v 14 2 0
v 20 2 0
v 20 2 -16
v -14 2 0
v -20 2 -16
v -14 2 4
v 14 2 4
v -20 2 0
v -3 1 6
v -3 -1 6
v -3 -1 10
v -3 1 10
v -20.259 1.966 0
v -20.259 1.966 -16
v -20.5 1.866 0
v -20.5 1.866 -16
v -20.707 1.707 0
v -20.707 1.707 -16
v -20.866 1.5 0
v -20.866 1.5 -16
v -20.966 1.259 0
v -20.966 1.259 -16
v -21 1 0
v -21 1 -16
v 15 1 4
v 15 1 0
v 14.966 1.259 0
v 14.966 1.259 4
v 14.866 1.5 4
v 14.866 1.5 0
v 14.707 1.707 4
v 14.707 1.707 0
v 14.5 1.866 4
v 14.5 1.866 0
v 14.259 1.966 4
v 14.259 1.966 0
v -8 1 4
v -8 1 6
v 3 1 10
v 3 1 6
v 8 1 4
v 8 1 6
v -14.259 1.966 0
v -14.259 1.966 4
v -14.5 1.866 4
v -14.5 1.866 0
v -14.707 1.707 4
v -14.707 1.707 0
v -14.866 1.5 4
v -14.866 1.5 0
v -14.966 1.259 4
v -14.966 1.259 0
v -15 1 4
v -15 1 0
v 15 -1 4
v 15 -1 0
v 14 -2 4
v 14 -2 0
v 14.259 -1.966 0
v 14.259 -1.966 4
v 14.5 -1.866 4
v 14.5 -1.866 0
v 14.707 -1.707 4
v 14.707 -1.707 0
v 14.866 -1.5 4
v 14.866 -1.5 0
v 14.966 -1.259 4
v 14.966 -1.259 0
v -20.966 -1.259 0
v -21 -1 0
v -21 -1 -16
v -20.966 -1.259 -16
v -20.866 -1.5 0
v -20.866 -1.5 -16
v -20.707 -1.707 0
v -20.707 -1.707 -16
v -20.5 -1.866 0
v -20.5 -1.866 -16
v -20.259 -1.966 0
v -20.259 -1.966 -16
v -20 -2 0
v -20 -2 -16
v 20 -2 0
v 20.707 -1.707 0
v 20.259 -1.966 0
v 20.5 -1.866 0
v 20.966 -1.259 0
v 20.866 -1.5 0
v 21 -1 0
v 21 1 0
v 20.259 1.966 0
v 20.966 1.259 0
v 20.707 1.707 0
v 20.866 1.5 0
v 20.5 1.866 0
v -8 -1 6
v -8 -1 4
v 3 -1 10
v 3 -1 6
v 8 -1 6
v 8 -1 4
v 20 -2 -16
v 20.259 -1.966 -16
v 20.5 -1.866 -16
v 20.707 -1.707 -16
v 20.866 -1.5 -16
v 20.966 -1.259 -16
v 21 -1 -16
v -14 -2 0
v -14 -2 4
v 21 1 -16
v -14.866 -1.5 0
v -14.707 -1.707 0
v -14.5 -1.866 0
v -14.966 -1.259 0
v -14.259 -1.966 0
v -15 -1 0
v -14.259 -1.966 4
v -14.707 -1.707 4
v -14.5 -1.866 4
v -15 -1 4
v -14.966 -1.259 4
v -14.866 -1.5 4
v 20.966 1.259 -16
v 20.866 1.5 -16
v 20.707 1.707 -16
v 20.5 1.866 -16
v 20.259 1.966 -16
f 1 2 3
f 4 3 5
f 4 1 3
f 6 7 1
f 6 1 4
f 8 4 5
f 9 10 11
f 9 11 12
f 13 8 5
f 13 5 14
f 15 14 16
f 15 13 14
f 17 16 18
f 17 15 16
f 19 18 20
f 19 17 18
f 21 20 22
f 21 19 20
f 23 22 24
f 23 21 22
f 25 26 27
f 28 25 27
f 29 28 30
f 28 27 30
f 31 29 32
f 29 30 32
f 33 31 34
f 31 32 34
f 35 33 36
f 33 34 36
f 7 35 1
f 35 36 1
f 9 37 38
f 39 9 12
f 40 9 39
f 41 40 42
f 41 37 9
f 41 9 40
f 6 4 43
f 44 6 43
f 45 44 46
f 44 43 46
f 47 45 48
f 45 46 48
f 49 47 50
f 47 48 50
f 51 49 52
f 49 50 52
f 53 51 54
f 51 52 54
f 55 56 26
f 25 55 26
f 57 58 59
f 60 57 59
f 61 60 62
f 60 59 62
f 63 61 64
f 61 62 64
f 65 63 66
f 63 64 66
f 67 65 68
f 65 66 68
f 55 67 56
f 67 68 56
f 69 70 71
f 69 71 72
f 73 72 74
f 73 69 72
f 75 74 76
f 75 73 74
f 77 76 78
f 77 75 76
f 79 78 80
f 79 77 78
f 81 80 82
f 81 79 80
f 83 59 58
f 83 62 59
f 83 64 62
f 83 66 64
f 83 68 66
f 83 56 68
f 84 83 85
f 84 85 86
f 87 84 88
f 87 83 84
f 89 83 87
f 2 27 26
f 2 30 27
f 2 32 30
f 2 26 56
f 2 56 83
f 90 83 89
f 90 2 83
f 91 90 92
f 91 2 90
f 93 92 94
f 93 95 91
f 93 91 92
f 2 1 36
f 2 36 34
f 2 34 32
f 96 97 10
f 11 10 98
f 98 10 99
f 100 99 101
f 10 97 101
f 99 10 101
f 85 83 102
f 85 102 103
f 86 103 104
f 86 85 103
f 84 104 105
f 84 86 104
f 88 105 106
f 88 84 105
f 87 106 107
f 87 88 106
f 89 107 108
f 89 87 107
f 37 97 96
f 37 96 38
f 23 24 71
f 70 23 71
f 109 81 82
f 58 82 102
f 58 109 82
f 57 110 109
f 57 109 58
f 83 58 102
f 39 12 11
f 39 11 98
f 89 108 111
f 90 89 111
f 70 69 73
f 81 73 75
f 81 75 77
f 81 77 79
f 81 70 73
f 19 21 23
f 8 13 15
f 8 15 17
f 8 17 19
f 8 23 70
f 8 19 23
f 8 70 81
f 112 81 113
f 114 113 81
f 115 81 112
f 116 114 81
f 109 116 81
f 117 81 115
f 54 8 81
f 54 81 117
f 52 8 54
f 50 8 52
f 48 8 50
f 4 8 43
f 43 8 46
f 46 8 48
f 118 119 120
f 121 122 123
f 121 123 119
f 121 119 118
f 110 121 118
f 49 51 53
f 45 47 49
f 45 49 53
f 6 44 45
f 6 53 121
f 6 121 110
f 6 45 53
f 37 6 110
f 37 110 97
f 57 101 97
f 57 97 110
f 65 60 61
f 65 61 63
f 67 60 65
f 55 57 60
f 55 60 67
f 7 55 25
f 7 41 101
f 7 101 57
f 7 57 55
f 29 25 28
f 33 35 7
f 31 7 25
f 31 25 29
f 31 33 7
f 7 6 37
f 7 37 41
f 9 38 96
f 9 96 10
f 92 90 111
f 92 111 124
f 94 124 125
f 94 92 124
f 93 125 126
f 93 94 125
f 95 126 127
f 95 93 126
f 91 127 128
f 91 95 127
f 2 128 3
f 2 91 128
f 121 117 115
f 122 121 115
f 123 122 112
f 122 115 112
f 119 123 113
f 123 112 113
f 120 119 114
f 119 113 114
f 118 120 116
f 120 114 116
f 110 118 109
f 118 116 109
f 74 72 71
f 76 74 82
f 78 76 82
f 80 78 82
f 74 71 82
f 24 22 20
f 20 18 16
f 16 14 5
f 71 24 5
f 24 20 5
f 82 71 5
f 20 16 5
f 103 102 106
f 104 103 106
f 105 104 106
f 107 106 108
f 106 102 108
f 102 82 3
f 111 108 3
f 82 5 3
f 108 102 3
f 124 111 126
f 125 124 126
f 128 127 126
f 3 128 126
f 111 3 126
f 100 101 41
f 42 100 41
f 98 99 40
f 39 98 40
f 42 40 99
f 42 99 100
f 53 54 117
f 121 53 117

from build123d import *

# Parameters (mm, degrees)
F0_W     = 5
F0_H     = 2
F0_W_2   = 6
F1_DEPTH = 16
F2_DEPTH = 4
F3_DEPTH = 6
F4_DEPTH = 10


with BuildPart() as f1:
    # F0 (on Top) → F1 (new body)
    with BuildSketch(Plane.XY):
        with BuildLine():
            Line((-20, -2), (-14, -2))
            ThreePointArc((-14, -2), (-14.707107, -1.707107), (-15, -1))
            Line((-15, -1), (-15, 1))
            ThreePointArc((-15, 1), (-14.707107, 1.707107), (-14, 2))
            Line((-14, 2), (-20, 2))
            ThreePointArc((-20, 2), (-20.707107, 1.707107), (-21, 1))
            Line((-21, 1), (-21, -1))
            ThreePointArc((-21, -1), (-20.707107, -1.707107), (-20, -2))
        make_face()
        with BuildLine():
            Line((-14, -2), (14, -2))
            ThreePointArc((14, -2), (14.707107, -1.707107), (15, -1))
            Line((15, -1), (15, 1))
            ThreePointArc((15, 1), (14.707107, 1.707107), (14, 2))
            Line((14, 2), (-14, 2))
            ThreePointArc((-14, 2), (-14.707107, 1.707107), (-15, 1))
            Line((-15, 1), (-15, -1))
            ThreePointArc((-15, -1), (-14.707107, -1.707107), (-14, -2))
        make_face()
        Polygon((8, -1), (3, -1), (-3, -1), (-8, -1), (-8, 1), (-3, 1), (3, 1), (8, 1), align=None, mode=Mode.SUBTRACT)
        with Locations((-5.5, 0)):
            Rectangle(F0_W, F0_H)
        Rectangle(F0_W_2, F0_H)
        with Locations((5.5, 0)):
            Rectangle(F0_W, F0_H)
        with BuildLine():
            Line((14, -2), (20, -2))
            ThreePointArc((20, -2), (20.707107, -1.707107), (21, -1))
            Line((21, -1), (21, 1))
            ThreePointArc((21, 1), (20.707107, 1.707107), (20, 2))
            Line((20, 2), (14, 2))
            ThreePointArc((14, 2), (14.707107, 1.707107), (15, 1))
            Line((15, 1), (15, -1))
            ThreePointArc((15, -1), (14.707107, -1.707107), (14, -2))
        make_face()
    extrude(amount=-F1_DEPTH)

    # F0 (on Top) → F2 (join)
    with BuildSketch(Plane.XY):
        with BuildLine():
            Line((-14, -2), (14, -2))
            ThreePointArc((14, -2), (14.707107, -1.707107), (15, -1))
            Line((15, -1), (15, 1))
            ThreePointArc((15, 1), (14.707107, 1.707107), (14, 2))
            Line((14, 2), (-14, 2))
            ThreePointArc((-14, 2), (-14.707107, 1.707107), (-15, 1))
            Line((-15, 1), (-15, -1))
            ThreePointArc((-15, -1), (-14.707107, -1.707107), (-14, -2))
        make_face()
        Polygon((8, -1), (3, -1), (-3, -1), (-8, -1), (-8, 1), (-3, 1), (3, 1), (8, 1), align=None, mode=Mode.SUBTRACT)
    extrude(amount=F2_DEPTH)

    # F0 (on Top) → F3 (join)
    with BuildSketch(Plane.XY):
        with Locations((-5.5, 0)):
            Rectangle(F0_W, F0_H)
        with Locations((5.5, 0)):
            Rectangle(F0_W, F0_H)
    extrude(amount=F3_DEPTH)

    # F0 (on Top) → F4 (join)
    with BuildSketch(Plane.XY):
        Rectangle(F0_W_2, F0_H)
    extrude(amount=F4_DEPTH)


solid = f1.part
